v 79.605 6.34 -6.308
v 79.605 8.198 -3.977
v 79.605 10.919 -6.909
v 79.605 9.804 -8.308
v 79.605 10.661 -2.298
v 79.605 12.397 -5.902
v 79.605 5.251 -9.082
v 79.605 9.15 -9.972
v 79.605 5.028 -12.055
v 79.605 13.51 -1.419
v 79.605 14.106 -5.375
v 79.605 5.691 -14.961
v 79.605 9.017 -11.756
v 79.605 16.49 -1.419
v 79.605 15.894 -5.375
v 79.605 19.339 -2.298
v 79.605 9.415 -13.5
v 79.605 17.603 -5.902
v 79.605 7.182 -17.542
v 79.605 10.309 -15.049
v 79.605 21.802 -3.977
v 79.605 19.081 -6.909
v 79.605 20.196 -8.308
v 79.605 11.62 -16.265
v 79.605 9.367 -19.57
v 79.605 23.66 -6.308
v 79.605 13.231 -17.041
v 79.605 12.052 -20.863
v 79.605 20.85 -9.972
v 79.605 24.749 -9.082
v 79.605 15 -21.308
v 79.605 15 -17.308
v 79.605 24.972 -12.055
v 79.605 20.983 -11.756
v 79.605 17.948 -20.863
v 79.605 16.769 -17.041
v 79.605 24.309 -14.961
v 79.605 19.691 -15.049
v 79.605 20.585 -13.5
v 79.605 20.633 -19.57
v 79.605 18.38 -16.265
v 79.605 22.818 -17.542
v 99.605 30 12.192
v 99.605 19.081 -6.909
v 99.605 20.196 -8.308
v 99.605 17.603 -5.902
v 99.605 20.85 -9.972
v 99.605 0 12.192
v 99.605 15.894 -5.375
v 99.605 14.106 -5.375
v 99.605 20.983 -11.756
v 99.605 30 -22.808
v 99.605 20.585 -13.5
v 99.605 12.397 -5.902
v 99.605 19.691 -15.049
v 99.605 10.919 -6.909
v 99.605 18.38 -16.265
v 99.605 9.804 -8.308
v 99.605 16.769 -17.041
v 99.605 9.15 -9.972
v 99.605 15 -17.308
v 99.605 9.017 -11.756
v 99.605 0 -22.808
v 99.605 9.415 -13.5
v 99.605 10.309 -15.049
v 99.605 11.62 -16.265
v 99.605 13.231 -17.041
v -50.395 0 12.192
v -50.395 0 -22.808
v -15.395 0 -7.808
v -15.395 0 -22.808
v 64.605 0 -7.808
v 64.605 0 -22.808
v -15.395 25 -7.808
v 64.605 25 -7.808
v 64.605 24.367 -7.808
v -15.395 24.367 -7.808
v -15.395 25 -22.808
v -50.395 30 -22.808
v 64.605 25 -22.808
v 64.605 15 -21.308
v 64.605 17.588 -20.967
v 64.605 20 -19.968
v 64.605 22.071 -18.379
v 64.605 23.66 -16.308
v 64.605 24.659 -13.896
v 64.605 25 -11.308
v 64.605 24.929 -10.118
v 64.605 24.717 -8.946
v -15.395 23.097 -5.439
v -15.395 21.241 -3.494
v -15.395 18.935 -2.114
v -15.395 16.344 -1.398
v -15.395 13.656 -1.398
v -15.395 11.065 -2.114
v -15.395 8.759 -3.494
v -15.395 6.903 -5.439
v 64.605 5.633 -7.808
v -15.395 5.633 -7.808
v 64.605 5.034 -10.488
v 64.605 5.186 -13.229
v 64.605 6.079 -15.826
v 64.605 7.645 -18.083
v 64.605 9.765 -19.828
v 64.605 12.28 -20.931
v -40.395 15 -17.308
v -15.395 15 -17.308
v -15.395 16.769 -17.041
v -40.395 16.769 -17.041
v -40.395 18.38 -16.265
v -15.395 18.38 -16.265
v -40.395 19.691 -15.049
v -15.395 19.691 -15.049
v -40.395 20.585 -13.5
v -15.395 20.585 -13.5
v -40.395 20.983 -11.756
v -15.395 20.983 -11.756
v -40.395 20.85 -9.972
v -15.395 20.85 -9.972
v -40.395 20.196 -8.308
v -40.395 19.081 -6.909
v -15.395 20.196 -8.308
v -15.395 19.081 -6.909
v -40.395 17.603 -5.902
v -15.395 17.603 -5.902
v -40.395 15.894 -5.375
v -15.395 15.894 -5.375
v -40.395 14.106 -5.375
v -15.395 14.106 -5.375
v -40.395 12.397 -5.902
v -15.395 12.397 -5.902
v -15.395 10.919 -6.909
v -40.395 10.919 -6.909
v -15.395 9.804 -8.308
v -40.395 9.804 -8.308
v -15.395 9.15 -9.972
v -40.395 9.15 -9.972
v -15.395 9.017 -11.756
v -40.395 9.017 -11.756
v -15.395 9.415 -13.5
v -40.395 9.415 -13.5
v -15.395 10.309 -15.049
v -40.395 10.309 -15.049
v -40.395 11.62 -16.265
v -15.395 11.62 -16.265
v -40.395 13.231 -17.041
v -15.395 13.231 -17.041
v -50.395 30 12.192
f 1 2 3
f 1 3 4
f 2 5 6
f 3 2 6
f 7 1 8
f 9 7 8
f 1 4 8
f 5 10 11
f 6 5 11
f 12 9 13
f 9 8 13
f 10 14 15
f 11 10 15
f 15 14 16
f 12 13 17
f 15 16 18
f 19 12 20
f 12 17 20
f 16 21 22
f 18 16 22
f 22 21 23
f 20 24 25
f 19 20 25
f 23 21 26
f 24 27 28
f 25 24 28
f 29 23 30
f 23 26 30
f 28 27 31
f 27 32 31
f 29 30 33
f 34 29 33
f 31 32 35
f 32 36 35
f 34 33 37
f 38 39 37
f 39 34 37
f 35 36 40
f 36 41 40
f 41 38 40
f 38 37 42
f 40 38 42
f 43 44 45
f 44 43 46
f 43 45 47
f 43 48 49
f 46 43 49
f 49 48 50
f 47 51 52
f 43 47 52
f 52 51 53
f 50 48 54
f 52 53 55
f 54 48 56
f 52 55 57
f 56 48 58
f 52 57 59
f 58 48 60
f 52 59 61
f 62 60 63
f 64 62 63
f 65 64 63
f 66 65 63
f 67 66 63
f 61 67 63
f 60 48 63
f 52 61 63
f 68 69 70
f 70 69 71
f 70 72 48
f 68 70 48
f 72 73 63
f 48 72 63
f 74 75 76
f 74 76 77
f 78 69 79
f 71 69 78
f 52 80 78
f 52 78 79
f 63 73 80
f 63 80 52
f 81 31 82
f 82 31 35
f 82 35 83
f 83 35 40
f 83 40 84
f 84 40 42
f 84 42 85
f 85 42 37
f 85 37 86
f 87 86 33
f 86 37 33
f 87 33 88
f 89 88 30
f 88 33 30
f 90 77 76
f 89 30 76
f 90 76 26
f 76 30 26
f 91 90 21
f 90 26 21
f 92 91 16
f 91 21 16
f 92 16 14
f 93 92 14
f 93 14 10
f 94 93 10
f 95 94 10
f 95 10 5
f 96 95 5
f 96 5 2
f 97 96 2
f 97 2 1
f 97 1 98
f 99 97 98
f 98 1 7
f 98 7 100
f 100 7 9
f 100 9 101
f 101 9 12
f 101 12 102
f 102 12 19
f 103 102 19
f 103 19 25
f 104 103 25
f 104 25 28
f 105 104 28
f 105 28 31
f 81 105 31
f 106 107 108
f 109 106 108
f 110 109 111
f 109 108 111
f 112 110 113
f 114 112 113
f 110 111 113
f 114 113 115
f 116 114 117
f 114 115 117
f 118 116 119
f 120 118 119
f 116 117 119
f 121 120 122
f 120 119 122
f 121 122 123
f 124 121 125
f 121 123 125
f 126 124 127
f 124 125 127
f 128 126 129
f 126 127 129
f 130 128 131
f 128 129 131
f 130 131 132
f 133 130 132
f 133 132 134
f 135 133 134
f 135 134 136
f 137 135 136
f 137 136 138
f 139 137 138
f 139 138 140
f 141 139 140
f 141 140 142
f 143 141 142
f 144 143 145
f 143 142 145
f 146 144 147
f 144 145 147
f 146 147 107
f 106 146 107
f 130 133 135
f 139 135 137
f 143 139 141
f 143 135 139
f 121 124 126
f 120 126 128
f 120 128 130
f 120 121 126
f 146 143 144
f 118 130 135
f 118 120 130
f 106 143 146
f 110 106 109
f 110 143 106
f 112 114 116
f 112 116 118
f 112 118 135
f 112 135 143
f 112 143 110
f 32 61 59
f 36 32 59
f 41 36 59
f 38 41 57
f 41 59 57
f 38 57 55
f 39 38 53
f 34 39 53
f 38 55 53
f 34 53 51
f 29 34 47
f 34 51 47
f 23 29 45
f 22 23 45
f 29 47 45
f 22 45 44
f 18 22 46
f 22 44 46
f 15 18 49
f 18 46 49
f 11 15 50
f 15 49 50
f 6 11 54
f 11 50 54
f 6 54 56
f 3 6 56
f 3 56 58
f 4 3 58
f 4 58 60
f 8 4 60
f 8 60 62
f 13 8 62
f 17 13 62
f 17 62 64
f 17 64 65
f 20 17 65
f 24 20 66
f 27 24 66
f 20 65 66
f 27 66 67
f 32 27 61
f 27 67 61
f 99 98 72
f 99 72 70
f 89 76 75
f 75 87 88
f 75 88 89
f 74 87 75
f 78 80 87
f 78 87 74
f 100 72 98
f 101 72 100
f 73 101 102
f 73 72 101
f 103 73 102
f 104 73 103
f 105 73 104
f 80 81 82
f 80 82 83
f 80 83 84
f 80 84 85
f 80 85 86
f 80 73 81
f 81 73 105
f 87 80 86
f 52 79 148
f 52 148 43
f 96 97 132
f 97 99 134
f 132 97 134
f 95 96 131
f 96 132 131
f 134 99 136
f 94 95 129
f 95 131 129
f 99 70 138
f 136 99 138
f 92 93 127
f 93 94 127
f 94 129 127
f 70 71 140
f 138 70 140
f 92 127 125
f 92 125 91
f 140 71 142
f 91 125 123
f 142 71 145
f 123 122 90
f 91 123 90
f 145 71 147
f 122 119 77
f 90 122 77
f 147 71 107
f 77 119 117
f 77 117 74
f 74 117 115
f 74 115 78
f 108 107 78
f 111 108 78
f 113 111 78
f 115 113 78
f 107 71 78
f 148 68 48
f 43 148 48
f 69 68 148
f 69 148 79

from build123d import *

# Parameters (mm, degrees)
SKETCH_1_W          = 150
SKETCH_1_H          = 35
EXTRUDE_1_DEPTH     = 30
SKETCH_2_R          = 6
CUT_EXTRUDE_3_DEPTH = 20
SKETCH_3_W          = 80
SKETCH_3_H          = 25
CUT_EXTRUDE_2_DEPTH = 15
SKETCH_5_R          = 10
CUT_EXTRUDE_6_DEPTH = 95
SKETCH_6_R          = 6
CUT_EXTRUDE_7_DEPTH = 25


with BuildPart() as part:
    # Эскиз1 → Бобышка-Вытянуть1 (new body)
    with BuildSketch(Plane(origin=(0, 0, 0), x_dir=(1, 0, 0), z_dir=(0, 1, 0))):
        with Locations((24.604604994, 5.307565724)):
            Rectangle(SKETCH_1_W, SKETCH_1_H)
    extrude(amount=EXTRUDE_1_DEPTH)

    # Эскиз2 → Вырез-Вытянуть3 (cut)
    with BuildSketch(Plane(origin=(99.604604994, 0, 0), x_dir=(0, 0, -1), z_dir=(1, 0, 0))):
        with Locations((11.307565724, 15)):
            Circle(SKETCH_2_R)
    extrude(amount=-CUT_EXTRUDE_3_DEPTH, mode=Mode.SUBTRACT)

    # Эскиз3 → Вырез-Вытянуть2 (cut)
    with BuildSketch(Plane(origin=(0, 0, -22.807565724), x_dir=(-1, 0, 0), z_dir=(0, 0, -1))):
        with Locations((-24.604604994, 12.5)):
            Rectangle(SKETCH_3_W, SKETCH_3_H)
    extrude(amount=-CUT_EXTRUDE_2_DEPTH, mode=Mode.SUBTRACT)

    # Эскиз5 → Вырез-Вытянуть6 (cut)
    with BuildSketch(Plane(origin=(79.604604994, 0, 0), x_dir=(0, 0, -1), z_dir=(1, 0, 0))):
        with Locations((11.307565724, 15)):
            Circle(SKETCH_5_R)
    extrude(amount=-CUT_EXTRUDE_6_DEPTH, mode=Mode.SUBTRACT)

    # Эскиз6 → Вырез-Вытянуть7 (cut)
    with BuildSketch(Plane(origin=(-15.395395006, 0, 0), x_dir=(0, 0, -1), z_dir=(1, 0, 0))):
        with Locations((11.307565724, 15)):
            Circle(SKETCH_6_R)
    extrude(amount=-CUT_EXTRUDE_7_DEPTH, mode=Mode.SUBTRACT)


solid = part.part
